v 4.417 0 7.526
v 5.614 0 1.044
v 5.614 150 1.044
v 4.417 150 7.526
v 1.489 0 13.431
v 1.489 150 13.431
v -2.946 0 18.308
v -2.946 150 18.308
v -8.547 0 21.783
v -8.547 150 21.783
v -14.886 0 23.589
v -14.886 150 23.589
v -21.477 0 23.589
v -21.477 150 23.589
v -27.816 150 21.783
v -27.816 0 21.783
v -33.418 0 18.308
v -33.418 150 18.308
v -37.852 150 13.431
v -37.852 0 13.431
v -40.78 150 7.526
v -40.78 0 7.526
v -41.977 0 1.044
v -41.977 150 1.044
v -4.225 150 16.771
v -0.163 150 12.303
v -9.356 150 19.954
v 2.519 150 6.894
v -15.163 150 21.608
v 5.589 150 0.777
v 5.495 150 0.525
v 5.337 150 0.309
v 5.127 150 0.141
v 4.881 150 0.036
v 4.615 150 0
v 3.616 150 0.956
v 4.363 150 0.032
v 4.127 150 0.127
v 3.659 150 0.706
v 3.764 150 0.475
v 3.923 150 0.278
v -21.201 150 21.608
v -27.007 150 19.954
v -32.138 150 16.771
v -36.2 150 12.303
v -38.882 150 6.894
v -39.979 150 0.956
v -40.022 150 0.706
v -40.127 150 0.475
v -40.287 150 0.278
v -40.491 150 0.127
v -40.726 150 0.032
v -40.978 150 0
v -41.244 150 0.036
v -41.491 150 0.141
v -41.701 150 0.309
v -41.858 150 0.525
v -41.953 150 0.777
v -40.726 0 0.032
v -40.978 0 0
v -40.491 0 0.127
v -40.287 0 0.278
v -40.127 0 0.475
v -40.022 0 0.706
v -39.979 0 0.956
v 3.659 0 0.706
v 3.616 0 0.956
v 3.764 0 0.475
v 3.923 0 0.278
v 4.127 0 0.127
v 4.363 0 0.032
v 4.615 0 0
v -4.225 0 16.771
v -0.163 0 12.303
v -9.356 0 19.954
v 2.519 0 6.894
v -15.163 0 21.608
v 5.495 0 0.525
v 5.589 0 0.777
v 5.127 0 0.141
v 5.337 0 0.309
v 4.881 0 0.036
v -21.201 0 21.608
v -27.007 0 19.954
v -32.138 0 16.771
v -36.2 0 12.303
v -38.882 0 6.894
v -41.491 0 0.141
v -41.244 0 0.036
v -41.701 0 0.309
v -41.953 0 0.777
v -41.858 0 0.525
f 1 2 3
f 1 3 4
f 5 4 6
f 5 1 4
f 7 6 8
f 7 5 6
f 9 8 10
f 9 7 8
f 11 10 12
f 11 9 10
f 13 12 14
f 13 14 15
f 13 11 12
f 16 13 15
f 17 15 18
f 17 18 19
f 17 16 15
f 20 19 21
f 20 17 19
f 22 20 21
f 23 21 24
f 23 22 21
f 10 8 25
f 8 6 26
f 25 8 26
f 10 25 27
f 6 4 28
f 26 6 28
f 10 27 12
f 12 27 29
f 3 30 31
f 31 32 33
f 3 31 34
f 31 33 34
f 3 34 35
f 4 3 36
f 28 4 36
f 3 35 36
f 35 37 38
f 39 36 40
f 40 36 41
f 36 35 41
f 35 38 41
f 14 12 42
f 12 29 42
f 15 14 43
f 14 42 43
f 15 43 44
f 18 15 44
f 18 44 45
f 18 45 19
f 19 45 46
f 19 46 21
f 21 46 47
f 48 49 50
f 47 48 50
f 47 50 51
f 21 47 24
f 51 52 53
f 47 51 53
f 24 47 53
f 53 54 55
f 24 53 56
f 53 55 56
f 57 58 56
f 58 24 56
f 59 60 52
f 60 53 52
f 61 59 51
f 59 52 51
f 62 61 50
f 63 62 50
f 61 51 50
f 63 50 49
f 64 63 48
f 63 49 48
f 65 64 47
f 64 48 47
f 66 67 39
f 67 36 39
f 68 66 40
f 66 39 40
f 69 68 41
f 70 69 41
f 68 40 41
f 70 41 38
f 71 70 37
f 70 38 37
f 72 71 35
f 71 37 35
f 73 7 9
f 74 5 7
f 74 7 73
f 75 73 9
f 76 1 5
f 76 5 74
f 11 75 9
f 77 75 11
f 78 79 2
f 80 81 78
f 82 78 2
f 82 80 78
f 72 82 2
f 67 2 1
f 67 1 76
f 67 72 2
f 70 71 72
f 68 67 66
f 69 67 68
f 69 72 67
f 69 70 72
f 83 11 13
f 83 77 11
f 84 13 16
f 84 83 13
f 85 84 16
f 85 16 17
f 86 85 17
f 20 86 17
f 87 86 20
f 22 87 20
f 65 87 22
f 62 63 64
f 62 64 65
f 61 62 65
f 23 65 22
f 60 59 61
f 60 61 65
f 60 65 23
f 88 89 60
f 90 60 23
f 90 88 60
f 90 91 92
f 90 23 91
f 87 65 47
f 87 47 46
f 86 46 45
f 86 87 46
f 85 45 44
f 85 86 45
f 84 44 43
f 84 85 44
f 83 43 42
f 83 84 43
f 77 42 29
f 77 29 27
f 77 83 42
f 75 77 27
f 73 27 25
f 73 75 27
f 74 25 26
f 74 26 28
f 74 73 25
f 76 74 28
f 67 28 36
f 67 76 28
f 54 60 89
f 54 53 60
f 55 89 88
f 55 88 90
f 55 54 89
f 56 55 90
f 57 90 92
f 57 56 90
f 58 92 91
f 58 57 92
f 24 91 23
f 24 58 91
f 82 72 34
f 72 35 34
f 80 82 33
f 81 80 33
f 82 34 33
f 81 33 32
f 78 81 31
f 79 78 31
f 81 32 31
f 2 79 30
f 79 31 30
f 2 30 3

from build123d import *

# Parameters (mm, degrees)
BOSS_EXTRUDE1_DEPTH = 150
FILLET1_R           = 1


with BuildPart() as part:
    # Sketch1 → Boss-Extrude1 (new body)
    with BuildSketch(Plane(origin=(0, 0, 0), x_dir=(1, 0, 0), z_dir=(0, 1, 0))):
        with BuildLine():
            Line((-42, 0), (-40, 0))
            ThreePointArc((-40, 0), (-18.181666667, -21.818333333), (3.636666667, 0))
            Line((3.636666667, 0), (5.636666667, 0))
            ThreePointArc((5.636666667, 0), (-18.181666667, -23.818333333), (-42, 0))
        make_face()
    extrude(amount=BOSS_EXTRUDE1_DEPTH)

    # Fillet1
    fillet1_edges = [part.edges().sort_by_distance(p)[0] for p in [
        (5.636666667, 75, 0),
        (3.636666667, 75, 0),
        (-40, 75, 0),
        (-42, 75, 0),
    ]]
    fillet(fillet1_edges, radius=FILLET1_R - 0.0001)  # a hair under: the kernel refuses the full size


solid = part.part
